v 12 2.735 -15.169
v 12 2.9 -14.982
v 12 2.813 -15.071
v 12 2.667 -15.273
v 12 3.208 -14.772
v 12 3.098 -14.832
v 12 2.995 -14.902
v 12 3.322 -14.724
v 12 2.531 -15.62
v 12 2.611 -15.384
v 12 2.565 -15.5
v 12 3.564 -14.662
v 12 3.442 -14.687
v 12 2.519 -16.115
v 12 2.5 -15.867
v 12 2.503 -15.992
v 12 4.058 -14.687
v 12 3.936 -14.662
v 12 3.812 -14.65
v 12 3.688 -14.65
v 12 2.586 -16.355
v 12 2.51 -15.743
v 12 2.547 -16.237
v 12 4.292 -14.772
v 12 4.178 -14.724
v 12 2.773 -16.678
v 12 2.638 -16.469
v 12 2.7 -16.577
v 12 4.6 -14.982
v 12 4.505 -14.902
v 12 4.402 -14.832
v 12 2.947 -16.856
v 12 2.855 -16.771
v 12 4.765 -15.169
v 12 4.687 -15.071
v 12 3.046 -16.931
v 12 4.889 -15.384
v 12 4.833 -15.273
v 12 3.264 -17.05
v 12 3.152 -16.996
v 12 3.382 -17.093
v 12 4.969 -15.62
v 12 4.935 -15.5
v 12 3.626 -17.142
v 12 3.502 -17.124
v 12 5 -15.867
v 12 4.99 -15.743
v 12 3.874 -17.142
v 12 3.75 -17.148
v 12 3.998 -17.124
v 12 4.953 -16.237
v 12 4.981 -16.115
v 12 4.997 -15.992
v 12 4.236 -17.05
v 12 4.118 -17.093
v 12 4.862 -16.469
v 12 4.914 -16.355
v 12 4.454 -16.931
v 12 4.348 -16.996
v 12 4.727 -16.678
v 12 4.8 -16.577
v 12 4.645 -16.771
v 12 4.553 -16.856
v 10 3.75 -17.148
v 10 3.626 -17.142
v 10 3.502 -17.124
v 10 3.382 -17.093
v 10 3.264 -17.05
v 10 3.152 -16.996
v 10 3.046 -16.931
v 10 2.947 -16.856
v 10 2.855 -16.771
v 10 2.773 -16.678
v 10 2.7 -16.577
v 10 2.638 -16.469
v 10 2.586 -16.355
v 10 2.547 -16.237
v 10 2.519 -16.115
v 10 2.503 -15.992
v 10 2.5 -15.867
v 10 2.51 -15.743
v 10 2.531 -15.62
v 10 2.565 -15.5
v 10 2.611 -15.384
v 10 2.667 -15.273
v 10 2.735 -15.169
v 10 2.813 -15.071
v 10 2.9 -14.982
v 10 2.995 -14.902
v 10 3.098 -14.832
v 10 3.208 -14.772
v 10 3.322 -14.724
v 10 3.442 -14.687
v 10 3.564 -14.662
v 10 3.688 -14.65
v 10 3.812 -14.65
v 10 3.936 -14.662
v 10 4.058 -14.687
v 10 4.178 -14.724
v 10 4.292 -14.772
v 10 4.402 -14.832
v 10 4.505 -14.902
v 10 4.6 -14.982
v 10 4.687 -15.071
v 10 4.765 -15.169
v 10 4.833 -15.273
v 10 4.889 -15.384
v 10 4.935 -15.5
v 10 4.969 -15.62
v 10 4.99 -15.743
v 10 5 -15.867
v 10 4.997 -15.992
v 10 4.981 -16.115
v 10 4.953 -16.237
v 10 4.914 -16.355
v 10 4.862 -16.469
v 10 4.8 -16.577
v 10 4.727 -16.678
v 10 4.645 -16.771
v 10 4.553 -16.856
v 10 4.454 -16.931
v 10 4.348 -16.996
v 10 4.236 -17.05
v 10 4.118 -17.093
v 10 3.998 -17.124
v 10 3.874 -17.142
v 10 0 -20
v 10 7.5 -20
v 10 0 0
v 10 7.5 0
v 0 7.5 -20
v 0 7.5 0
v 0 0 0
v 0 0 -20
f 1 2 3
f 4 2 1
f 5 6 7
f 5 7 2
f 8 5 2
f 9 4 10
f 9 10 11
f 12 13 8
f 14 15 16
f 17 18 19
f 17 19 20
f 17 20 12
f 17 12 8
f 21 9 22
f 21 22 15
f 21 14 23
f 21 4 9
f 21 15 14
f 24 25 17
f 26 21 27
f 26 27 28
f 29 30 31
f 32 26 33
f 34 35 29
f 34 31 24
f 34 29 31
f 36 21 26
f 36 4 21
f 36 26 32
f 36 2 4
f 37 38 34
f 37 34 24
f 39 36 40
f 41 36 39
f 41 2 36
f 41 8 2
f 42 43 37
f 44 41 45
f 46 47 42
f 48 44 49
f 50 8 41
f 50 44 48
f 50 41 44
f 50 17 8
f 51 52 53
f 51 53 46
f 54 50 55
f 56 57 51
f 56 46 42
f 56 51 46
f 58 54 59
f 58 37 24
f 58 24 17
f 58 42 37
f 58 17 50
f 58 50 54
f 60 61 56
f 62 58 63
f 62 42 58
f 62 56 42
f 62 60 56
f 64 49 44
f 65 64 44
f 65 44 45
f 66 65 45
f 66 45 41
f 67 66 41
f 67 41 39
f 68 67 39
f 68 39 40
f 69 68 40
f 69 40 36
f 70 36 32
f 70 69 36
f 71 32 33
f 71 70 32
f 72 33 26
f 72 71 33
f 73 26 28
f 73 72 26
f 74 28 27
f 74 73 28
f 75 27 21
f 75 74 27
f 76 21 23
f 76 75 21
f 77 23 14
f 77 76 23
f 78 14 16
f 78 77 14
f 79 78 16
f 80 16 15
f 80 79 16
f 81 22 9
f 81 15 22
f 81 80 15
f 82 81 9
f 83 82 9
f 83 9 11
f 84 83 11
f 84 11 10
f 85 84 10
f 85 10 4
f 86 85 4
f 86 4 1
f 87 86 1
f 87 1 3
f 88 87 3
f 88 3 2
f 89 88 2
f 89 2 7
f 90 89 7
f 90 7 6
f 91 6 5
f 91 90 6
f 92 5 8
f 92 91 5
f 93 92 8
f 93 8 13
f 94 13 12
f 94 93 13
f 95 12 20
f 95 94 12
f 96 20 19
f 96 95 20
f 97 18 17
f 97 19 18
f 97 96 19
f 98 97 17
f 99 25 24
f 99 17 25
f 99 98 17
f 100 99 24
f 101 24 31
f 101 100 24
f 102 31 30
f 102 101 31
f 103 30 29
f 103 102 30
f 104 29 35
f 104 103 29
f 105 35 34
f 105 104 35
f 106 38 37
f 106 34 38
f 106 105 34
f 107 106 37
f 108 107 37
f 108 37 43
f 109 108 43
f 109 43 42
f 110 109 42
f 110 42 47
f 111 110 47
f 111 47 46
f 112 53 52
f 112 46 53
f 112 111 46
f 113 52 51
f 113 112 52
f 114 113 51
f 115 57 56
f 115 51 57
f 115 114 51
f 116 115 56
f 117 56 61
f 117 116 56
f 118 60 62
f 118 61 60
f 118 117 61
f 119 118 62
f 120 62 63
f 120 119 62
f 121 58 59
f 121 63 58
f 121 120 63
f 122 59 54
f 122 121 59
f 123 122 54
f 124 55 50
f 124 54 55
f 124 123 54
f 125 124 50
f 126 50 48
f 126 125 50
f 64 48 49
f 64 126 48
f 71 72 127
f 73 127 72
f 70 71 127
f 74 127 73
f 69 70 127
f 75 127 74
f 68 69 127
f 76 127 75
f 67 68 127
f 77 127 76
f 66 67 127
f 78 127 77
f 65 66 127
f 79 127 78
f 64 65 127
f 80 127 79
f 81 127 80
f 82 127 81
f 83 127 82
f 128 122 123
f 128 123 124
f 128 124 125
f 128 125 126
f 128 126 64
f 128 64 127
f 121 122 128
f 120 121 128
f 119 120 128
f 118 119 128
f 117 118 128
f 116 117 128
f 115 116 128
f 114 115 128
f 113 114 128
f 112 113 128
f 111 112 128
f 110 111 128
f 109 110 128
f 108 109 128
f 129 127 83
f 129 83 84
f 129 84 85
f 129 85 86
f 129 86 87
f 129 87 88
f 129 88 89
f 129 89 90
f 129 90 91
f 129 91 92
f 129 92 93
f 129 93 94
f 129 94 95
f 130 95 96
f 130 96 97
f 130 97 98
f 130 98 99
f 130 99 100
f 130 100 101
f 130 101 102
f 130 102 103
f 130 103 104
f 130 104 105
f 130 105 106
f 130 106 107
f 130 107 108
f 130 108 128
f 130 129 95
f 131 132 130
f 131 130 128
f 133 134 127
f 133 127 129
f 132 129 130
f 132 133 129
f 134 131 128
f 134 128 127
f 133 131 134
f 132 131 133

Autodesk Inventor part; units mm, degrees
ref_plane "YZ Plane" through (0, 0, 0) normal (1, 0, 0) x (0, 1, 0)
ref_plane "XZ Plane" through (0, 0, 0) normal (0, 1, 0) x (-1, 0, 0)
ref_plane "XY Plane" through (0, 0, 0) normal (0, 0, 1) x (1, 0, 0)
sketch "Sketch1" plane through (0, 0, 0) normal (1, 0, 0) x (0, 1, 0)
  line L0 (0, 0) -> (7.5, 0)
  line L1 (7.5, 0) -> (7.5, -20)
  line L2 (7.5, -20) -> (0, -20)
  line L3 (0, -20) -> (0, 0)
  circle A0 centre (3.75, -15.8984) radius 1.25
  dimension "d0" = 7.5
  dimension "d1" = 20
  dimension "d2" = 2.5
extrude "Extrusion1" add sketch "Sketch1" along normal blind 10
sketch "Sketch2" plane through (10, 0, 0) normal (1, 0, 0) x (0, 0, -1)
  line L0 (20, 7.5) -> (0, 7.5) projected
  line L1 (0, 7.5) -> (20, 7.5)
  line L2 (20, 7.5) -> (20, 0)
  line L3 (20, 0) -> (0, 0)
  line L4 (0, 0) -> (0, 7.5)
  circle A0 centre (15.8984, 3.75) radius 1.25 projected
  circle A1 centre (15.8984, 3.75) radius 1.25
sketch "Sketch3" plane through (0, 7.5, 0) normal (0, 1, 0) x (1, 0, 0)
  point P0 (0, 0)
extrude "Extrusion2" add sketch "Sketch2" along normal blind 2 contours A0
sketch "Sketch4" plane through (10, 3.75, -15.8984) normal (-1, 0, 0) x (0, 0, 1)
  circle A0 centre (0, 0) radius 1.25
  point P0 (15.8984, -3.75)
extrude "Extrusion3" add sketch "Sketch4" along normal blind 10
properties part number "servo"
